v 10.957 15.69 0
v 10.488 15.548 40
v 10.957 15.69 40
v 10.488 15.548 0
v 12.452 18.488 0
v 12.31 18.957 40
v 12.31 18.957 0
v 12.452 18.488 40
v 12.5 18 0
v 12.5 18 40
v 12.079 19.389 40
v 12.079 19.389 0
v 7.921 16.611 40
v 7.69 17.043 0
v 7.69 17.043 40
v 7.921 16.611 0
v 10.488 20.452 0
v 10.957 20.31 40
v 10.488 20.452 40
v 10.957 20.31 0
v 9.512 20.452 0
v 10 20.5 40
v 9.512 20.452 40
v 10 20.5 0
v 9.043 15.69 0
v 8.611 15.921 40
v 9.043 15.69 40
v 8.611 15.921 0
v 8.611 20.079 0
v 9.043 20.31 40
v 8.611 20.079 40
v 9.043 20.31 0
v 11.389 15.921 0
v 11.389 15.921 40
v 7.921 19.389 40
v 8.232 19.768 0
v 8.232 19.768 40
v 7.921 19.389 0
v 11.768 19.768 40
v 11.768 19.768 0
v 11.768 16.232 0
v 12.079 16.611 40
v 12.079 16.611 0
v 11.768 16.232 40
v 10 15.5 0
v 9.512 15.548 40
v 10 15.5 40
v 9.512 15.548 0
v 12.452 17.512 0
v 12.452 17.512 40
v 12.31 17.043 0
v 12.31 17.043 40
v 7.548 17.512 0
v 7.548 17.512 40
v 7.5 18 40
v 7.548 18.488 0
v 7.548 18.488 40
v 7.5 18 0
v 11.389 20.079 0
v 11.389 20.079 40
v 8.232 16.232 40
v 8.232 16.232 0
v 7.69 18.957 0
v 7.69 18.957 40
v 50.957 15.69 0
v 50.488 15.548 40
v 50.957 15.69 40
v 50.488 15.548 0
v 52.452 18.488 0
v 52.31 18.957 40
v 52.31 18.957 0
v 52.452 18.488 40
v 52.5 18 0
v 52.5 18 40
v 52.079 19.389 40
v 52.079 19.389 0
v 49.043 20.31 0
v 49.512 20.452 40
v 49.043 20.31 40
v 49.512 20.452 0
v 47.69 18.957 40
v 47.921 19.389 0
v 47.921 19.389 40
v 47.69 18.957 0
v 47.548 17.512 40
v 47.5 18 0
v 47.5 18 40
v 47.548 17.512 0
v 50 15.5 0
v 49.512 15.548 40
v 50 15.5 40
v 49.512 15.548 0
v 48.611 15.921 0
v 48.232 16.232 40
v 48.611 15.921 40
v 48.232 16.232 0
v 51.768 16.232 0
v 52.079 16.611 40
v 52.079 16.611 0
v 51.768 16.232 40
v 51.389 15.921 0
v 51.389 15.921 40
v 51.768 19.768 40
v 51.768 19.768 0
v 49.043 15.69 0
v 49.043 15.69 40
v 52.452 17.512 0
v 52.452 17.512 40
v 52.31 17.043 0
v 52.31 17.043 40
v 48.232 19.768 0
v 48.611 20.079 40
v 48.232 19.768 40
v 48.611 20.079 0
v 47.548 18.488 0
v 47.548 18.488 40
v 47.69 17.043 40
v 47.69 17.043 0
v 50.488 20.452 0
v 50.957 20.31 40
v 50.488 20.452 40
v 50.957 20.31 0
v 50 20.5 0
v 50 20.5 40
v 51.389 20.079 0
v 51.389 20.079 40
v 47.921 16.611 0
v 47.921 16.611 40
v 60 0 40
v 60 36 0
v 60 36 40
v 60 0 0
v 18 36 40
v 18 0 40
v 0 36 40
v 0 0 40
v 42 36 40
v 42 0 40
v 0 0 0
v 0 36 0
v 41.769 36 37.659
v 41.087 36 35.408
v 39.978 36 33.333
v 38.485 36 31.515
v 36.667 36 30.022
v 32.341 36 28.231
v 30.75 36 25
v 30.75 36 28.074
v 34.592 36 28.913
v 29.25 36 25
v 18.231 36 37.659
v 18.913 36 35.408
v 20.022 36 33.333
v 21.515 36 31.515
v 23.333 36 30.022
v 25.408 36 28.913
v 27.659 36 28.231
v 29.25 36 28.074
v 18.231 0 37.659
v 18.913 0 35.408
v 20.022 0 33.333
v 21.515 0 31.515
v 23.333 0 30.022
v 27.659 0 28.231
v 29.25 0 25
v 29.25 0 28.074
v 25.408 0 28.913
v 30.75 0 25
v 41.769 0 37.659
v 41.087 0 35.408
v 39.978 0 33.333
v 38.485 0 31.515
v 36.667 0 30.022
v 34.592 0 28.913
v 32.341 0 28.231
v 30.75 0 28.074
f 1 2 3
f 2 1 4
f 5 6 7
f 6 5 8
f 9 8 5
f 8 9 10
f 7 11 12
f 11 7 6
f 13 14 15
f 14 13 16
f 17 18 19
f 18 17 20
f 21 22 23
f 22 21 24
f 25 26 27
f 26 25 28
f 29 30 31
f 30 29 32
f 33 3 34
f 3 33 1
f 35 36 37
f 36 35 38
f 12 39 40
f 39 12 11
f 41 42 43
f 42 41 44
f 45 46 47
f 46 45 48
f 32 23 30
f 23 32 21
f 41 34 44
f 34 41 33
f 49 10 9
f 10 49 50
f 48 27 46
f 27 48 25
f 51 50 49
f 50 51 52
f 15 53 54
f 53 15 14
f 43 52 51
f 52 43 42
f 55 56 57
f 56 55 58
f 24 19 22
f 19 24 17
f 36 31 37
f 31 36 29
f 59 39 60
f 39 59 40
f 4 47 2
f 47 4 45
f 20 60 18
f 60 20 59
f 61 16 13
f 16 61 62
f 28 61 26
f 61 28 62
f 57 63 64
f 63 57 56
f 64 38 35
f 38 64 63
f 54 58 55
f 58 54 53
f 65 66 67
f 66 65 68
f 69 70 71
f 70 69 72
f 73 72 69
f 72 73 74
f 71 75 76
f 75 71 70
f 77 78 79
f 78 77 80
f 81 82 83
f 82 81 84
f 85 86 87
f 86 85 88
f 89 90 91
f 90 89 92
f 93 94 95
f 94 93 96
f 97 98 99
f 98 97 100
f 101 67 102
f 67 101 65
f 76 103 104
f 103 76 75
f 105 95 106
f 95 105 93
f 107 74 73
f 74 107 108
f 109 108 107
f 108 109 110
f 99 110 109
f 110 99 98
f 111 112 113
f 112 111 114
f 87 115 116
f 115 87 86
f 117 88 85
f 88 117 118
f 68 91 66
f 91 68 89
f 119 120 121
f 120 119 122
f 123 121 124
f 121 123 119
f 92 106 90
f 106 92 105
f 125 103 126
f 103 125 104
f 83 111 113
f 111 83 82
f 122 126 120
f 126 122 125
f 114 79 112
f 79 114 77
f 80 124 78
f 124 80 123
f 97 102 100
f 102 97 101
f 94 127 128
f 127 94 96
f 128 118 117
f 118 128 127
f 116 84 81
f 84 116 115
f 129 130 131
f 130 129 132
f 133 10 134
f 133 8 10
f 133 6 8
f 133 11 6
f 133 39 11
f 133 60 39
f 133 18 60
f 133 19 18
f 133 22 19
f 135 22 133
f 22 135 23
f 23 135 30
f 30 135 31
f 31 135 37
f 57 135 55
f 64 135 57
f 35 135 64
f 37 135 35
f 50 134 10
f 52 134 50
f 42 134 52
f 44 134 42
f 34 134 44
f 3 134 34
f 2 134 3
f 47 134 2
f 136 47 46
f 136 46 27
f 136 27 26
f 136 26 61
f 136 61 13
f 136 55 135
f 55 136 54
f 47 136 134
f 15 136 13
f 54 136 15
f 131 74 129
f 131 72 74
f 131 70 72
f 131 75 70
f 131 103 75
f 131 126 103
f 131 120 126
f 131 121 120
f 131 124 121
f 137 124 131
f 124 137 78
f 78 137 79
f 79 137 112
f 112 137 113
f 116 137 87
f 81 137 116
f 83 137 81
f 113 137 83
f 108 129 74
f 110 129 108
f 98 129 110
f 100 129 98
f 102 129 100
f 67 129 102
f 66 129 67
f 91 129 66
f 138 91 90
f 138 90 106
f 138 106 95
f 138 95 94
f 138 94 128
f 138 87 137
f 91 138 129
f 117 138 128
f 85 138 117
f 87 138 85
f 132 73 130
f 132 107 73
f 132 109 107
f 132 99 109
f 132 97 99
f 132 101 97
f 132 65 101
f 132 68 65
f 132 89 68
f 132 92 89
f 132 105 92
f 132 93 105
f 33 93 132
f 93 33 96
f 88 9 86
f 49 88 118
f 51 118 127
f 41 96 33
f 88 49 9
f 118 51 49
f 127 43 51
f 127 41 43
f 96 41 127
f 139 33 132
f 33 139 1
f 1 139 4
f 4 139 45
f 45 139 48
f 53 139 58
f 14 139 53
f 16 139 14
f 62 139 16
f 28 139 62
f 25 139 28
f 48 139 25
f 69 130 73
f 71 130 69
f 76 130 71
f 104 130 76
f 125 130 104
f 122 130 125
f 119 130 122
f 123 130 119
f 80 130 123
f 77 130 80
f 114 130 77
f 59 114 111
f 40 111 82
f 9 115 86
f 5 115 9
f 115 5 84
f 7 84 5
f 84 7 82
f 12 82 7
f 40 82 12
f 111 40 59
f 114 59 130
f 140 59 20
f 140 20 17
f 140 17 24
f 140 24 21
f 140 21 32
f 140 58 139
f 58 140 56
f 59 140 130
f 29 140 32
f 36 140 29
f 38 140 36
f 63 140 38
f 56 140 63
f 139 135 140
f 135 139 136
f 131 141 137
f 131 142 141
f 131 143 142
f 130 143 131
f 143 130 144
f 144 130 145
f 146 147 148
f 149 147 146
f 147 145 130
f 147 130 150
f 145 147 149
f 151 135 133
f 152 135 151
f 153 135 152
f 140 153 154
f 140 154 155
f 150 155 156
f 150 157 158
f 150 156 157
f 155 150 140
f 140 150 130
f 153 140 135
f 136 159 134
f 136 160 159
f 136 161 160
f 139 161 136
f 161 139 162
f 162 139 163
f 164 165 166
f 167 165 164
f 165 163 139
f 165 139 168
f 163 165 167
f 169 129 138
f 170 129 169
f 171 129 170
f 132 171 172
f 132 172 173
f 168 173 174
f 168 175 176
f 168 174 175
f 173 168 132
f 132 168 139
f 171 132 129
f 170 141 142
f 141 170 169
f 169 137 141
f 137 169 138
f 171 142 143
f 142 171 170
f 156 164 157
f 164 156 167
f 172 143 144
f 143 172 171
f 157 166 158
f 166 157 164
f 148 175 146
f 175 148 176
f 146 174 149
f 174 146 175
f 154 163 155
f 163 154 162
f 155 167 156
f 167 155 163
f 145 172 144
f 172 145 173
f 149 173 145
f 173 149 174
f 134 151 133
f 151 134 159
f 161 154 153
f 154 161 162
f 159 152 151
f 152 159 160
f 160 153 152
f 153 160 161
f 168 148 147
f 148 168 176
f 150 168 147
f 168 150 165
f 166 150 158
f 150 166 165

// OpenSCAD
$fn = 32;

// ----------------------------------------------------------------------
// Saddle clamp: split shaft clamp
// ----------------------------------------------------------------------

// --- parameters (mm) ---
blk_l = 60;               // block length, X
blk_w = 36;               // block width, Y
blk_h = 40;               // block height
clamp_r = 12;             // shaft groove radius
hole_r = 2.5;             // bolt hole radius
hole_m = 10;              // bolt hole margin from the ends
saw_w = 1.5;              // saw kerf width

saw_depth = clamp_r + 3;  // saw kerf depth

difference() {
  cube([blk_l, blk_w, blk_h]);
  translate([blk_l / 2, -1, blk_h])
    rotate([-90, 0, 0])
      cylinder(h = blk_w + 2, r = clamp_r);
  for (sx = [0, 1])
    translate([sx ? blk_l - hole_m : hole_m, blk_w / 2, -1])
      cylinder(r = hole_r, h = blk_h + 2);
  translate([blk_l / 2 - saw_w / 2, -1, blk_h - saw_depth])
    cube([saw_w, blk_w + 2, saw_depth + 1]);
}
